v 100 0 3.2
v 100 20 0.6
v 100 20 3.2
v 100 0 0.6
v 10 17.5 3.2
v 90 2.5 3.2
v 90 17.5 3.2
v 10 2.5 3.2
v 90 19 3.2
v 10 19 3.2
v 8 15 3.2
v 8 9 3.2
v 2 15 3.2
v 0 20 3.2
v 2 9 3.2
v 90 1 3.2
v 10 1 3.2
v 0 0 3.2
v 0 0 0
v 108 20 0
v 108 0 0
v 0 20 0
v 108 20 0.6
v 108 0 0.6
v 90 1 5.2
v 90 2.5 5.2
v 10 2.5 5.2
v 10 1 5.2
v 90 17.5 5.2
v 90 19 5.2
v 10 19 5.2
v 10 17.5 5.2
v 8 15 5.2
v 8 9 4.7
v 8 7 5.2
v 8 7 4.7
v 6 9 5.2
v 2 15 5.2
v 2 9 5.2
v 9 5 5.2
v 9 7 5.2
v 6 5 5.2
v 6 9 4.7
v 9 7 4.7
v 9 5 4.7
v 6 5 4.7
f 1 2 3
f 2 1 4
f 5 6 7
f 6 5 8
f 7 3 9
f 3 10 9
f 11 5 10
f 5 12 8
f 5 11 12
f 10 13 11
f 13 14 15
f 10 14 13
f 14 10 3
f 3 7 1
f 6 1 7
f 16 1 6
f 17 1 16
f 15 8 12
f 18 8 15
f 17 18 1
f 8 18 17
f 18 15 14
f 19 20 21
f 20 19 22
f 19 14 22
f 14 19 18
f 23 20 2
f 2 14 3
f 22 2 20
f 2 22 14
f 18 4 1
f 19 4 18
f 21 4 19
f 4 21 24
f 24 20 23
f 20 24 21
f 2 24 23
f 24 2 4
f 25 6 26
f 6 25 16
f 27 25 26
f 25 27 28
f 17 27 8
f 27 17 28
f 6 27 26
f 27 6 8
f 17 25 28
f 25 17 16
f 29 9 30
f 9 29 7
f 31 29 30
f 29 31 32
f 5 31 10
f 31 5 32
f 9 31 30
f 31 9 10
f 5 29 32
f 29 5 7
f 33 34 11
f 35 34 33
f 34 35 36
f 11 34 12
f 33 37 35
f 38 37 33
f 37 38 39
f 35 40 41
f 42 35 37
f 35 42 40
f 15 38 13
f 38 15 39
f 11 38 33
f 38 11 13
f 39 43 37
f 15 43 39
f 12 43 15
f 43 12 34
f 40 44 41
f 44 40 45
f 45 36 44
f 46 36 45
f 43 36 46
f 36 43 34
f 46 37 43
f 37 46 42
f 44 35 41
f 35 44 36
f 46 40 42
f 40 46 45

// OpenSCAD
// Bag clip living hinge, PETG, 0.4 nozzle, no supports.
// Two halves contacting at hinge, open flat print pose.
// Fold: rotate upper 180 about [108,10,5.2] -Y. F(x)=216-x, F(z)=10.4-z.

part = "arm_lower"; // [arm_lower, arm_upper, assembly]
cadverify_only = "";

module instance(name, part, unit = 1) {
    echo(cadverify_instance = [name, part, unit]);
    if (cadverify_only == "" || cadverify_only == name) children();
}

module arm_lower() {
    cube([100, 20, 3.2], false);
    translate([99.9, 0, 0]) cube([8.1, 20, 0.6], false);
    translate([10, 1, 3.1]) cube([80, 1.5, 2.1], false);
    translate([10, 17.5, 3.1]) cube([80, 1.5, 2.1], false);
    // stop tower (central)
    translate([2, 9, 3.1]) cube([6, 6, 2.1], false);
    // lower hook base region uses body; hook lip + bridge
    translate([6, 5, 4.7]) cube([3, 2, 0.5], false);
    translate([6, 6.9, 4.7]) cube([2, 2.2, 0.5], false);
}

module arm_upper() {
    cube([8.1, 20, 0.6], false);
    translate([7.9, 0, 0]) cube([100.1, 20, 3.2], false);
    translate([100, 5, 3.1]) cube([6, 10, 2.1], false);
    translate([97.9, 6, 4.7]) cube([2.5, 8, 0.5], false);
    translate([107.9, 6, 0]) cube([8.1, 8, 3.2], false);
}

if (part == "arm_lower") {
    echo(cadverify_spec = [
        ["bounds", [[0, 0, 0], [108, 20, 5.2]]],
        ["bodies", 1],
        ["through_holes", 0],
        ["support_faces", [["bed", "-z", 1500]]],
        ["overhangs_allowed", [["latch lip", [[5.5, 4.5, 4.5], [9.5, 9.5, 5.5]]]]],
        ["copies", 1],
        ["details", [
            ["arm", "material", [[30, 10, 1.2], [70, 12, 2.0]], 1],
            ["arm_wall", "thickness", [50, 10, 10], [0, 0, -1], 3.2],
            ["hinge", "thickness", [104, 10, 5], [0, 0, -1], 0.6],
            ["rib", "material", [[30, 1.3, 3.8], [70, 2.2, 4.8]], 1],
            ["rib2", "material", [[30, 17.8, 3.8], [70, 18.7, 4.8]], 1],
            ["latch_tower", "material", [[3, 10, 3.8], [7, 14, 5.0]], 1],
            ["latch_lip", "material", [[6.5, 5.5, 4.8], [8.5, 6.5, 5.1]], 1],
            ["bag_slot", "void", [[30, 4, 3.8], [70, 16, 5.0]], 1]
        ]]
    ]);
    arm_lower();
} else if (part == "arm_upper") {
    echo(cadverify_spec = [
        ["bounds", [[0, 0, 0], [116, 20, 5.2]]],
        ["bodies", 1],
        ["through_holes", 0],
        ["support_faces", [["bed", "-z", 1500]]],
        ["overhangs_allowed", [["latch lip", [[97.5, 5.5, 4.5], [100.8, 14.5, 5.5]]]]],
        ["copies", 1],
        ["details", [
            ["arm", "material", [[30, 10, 1.2], [70, 12, 2.0]], 1],
            ["arm_wall", "thickness", [50, 10, 10], [0, 0, -1], 3.2],
            ["hinge", "thickness", [4, 10, 5], [0, 0, -1], 0.6],
            ["latch_tower", "material", [[100.5, 6, 3.8], [105.5, 13, 5.0]], 1],
            ["latch_lip", "material", [[98.2, 7, 4.8], [100.0, 13, 5.1]], 1],
            ["thumb_tab", "material", [[109, 7, 1.2], [114, 13, 2.0]], 1],
            ["field", "void", [[30, 4, 3.8], [70, 16, 5.0]], 1]
        ]]
    ]);
    arm_upper();
} else if (part == "assembly") {
    echo(cadverify_spec = [
        ["bounds", [[0, 0, 0], [224, 20, 5.2]]],
        ["support_faces", [["bed", "-z", 3000]]],
        ["motions", [
            ["close", ["upper"], "rotate", [108, 10, 5.2], [0, -1, 0], [0, 180],
                ["stops", [180]]
            ]
        ]],
        ["assembly_order", [
            [["lower"], [0, 0, 0]],
            [["upper"], [0, 0, -1]]
        ]]
    ]);
    instance("lower", "arm_lower") arm_lower();
    instance("upper", "arm_upper") translate([108, 0, 0]) arm_upper();
}
